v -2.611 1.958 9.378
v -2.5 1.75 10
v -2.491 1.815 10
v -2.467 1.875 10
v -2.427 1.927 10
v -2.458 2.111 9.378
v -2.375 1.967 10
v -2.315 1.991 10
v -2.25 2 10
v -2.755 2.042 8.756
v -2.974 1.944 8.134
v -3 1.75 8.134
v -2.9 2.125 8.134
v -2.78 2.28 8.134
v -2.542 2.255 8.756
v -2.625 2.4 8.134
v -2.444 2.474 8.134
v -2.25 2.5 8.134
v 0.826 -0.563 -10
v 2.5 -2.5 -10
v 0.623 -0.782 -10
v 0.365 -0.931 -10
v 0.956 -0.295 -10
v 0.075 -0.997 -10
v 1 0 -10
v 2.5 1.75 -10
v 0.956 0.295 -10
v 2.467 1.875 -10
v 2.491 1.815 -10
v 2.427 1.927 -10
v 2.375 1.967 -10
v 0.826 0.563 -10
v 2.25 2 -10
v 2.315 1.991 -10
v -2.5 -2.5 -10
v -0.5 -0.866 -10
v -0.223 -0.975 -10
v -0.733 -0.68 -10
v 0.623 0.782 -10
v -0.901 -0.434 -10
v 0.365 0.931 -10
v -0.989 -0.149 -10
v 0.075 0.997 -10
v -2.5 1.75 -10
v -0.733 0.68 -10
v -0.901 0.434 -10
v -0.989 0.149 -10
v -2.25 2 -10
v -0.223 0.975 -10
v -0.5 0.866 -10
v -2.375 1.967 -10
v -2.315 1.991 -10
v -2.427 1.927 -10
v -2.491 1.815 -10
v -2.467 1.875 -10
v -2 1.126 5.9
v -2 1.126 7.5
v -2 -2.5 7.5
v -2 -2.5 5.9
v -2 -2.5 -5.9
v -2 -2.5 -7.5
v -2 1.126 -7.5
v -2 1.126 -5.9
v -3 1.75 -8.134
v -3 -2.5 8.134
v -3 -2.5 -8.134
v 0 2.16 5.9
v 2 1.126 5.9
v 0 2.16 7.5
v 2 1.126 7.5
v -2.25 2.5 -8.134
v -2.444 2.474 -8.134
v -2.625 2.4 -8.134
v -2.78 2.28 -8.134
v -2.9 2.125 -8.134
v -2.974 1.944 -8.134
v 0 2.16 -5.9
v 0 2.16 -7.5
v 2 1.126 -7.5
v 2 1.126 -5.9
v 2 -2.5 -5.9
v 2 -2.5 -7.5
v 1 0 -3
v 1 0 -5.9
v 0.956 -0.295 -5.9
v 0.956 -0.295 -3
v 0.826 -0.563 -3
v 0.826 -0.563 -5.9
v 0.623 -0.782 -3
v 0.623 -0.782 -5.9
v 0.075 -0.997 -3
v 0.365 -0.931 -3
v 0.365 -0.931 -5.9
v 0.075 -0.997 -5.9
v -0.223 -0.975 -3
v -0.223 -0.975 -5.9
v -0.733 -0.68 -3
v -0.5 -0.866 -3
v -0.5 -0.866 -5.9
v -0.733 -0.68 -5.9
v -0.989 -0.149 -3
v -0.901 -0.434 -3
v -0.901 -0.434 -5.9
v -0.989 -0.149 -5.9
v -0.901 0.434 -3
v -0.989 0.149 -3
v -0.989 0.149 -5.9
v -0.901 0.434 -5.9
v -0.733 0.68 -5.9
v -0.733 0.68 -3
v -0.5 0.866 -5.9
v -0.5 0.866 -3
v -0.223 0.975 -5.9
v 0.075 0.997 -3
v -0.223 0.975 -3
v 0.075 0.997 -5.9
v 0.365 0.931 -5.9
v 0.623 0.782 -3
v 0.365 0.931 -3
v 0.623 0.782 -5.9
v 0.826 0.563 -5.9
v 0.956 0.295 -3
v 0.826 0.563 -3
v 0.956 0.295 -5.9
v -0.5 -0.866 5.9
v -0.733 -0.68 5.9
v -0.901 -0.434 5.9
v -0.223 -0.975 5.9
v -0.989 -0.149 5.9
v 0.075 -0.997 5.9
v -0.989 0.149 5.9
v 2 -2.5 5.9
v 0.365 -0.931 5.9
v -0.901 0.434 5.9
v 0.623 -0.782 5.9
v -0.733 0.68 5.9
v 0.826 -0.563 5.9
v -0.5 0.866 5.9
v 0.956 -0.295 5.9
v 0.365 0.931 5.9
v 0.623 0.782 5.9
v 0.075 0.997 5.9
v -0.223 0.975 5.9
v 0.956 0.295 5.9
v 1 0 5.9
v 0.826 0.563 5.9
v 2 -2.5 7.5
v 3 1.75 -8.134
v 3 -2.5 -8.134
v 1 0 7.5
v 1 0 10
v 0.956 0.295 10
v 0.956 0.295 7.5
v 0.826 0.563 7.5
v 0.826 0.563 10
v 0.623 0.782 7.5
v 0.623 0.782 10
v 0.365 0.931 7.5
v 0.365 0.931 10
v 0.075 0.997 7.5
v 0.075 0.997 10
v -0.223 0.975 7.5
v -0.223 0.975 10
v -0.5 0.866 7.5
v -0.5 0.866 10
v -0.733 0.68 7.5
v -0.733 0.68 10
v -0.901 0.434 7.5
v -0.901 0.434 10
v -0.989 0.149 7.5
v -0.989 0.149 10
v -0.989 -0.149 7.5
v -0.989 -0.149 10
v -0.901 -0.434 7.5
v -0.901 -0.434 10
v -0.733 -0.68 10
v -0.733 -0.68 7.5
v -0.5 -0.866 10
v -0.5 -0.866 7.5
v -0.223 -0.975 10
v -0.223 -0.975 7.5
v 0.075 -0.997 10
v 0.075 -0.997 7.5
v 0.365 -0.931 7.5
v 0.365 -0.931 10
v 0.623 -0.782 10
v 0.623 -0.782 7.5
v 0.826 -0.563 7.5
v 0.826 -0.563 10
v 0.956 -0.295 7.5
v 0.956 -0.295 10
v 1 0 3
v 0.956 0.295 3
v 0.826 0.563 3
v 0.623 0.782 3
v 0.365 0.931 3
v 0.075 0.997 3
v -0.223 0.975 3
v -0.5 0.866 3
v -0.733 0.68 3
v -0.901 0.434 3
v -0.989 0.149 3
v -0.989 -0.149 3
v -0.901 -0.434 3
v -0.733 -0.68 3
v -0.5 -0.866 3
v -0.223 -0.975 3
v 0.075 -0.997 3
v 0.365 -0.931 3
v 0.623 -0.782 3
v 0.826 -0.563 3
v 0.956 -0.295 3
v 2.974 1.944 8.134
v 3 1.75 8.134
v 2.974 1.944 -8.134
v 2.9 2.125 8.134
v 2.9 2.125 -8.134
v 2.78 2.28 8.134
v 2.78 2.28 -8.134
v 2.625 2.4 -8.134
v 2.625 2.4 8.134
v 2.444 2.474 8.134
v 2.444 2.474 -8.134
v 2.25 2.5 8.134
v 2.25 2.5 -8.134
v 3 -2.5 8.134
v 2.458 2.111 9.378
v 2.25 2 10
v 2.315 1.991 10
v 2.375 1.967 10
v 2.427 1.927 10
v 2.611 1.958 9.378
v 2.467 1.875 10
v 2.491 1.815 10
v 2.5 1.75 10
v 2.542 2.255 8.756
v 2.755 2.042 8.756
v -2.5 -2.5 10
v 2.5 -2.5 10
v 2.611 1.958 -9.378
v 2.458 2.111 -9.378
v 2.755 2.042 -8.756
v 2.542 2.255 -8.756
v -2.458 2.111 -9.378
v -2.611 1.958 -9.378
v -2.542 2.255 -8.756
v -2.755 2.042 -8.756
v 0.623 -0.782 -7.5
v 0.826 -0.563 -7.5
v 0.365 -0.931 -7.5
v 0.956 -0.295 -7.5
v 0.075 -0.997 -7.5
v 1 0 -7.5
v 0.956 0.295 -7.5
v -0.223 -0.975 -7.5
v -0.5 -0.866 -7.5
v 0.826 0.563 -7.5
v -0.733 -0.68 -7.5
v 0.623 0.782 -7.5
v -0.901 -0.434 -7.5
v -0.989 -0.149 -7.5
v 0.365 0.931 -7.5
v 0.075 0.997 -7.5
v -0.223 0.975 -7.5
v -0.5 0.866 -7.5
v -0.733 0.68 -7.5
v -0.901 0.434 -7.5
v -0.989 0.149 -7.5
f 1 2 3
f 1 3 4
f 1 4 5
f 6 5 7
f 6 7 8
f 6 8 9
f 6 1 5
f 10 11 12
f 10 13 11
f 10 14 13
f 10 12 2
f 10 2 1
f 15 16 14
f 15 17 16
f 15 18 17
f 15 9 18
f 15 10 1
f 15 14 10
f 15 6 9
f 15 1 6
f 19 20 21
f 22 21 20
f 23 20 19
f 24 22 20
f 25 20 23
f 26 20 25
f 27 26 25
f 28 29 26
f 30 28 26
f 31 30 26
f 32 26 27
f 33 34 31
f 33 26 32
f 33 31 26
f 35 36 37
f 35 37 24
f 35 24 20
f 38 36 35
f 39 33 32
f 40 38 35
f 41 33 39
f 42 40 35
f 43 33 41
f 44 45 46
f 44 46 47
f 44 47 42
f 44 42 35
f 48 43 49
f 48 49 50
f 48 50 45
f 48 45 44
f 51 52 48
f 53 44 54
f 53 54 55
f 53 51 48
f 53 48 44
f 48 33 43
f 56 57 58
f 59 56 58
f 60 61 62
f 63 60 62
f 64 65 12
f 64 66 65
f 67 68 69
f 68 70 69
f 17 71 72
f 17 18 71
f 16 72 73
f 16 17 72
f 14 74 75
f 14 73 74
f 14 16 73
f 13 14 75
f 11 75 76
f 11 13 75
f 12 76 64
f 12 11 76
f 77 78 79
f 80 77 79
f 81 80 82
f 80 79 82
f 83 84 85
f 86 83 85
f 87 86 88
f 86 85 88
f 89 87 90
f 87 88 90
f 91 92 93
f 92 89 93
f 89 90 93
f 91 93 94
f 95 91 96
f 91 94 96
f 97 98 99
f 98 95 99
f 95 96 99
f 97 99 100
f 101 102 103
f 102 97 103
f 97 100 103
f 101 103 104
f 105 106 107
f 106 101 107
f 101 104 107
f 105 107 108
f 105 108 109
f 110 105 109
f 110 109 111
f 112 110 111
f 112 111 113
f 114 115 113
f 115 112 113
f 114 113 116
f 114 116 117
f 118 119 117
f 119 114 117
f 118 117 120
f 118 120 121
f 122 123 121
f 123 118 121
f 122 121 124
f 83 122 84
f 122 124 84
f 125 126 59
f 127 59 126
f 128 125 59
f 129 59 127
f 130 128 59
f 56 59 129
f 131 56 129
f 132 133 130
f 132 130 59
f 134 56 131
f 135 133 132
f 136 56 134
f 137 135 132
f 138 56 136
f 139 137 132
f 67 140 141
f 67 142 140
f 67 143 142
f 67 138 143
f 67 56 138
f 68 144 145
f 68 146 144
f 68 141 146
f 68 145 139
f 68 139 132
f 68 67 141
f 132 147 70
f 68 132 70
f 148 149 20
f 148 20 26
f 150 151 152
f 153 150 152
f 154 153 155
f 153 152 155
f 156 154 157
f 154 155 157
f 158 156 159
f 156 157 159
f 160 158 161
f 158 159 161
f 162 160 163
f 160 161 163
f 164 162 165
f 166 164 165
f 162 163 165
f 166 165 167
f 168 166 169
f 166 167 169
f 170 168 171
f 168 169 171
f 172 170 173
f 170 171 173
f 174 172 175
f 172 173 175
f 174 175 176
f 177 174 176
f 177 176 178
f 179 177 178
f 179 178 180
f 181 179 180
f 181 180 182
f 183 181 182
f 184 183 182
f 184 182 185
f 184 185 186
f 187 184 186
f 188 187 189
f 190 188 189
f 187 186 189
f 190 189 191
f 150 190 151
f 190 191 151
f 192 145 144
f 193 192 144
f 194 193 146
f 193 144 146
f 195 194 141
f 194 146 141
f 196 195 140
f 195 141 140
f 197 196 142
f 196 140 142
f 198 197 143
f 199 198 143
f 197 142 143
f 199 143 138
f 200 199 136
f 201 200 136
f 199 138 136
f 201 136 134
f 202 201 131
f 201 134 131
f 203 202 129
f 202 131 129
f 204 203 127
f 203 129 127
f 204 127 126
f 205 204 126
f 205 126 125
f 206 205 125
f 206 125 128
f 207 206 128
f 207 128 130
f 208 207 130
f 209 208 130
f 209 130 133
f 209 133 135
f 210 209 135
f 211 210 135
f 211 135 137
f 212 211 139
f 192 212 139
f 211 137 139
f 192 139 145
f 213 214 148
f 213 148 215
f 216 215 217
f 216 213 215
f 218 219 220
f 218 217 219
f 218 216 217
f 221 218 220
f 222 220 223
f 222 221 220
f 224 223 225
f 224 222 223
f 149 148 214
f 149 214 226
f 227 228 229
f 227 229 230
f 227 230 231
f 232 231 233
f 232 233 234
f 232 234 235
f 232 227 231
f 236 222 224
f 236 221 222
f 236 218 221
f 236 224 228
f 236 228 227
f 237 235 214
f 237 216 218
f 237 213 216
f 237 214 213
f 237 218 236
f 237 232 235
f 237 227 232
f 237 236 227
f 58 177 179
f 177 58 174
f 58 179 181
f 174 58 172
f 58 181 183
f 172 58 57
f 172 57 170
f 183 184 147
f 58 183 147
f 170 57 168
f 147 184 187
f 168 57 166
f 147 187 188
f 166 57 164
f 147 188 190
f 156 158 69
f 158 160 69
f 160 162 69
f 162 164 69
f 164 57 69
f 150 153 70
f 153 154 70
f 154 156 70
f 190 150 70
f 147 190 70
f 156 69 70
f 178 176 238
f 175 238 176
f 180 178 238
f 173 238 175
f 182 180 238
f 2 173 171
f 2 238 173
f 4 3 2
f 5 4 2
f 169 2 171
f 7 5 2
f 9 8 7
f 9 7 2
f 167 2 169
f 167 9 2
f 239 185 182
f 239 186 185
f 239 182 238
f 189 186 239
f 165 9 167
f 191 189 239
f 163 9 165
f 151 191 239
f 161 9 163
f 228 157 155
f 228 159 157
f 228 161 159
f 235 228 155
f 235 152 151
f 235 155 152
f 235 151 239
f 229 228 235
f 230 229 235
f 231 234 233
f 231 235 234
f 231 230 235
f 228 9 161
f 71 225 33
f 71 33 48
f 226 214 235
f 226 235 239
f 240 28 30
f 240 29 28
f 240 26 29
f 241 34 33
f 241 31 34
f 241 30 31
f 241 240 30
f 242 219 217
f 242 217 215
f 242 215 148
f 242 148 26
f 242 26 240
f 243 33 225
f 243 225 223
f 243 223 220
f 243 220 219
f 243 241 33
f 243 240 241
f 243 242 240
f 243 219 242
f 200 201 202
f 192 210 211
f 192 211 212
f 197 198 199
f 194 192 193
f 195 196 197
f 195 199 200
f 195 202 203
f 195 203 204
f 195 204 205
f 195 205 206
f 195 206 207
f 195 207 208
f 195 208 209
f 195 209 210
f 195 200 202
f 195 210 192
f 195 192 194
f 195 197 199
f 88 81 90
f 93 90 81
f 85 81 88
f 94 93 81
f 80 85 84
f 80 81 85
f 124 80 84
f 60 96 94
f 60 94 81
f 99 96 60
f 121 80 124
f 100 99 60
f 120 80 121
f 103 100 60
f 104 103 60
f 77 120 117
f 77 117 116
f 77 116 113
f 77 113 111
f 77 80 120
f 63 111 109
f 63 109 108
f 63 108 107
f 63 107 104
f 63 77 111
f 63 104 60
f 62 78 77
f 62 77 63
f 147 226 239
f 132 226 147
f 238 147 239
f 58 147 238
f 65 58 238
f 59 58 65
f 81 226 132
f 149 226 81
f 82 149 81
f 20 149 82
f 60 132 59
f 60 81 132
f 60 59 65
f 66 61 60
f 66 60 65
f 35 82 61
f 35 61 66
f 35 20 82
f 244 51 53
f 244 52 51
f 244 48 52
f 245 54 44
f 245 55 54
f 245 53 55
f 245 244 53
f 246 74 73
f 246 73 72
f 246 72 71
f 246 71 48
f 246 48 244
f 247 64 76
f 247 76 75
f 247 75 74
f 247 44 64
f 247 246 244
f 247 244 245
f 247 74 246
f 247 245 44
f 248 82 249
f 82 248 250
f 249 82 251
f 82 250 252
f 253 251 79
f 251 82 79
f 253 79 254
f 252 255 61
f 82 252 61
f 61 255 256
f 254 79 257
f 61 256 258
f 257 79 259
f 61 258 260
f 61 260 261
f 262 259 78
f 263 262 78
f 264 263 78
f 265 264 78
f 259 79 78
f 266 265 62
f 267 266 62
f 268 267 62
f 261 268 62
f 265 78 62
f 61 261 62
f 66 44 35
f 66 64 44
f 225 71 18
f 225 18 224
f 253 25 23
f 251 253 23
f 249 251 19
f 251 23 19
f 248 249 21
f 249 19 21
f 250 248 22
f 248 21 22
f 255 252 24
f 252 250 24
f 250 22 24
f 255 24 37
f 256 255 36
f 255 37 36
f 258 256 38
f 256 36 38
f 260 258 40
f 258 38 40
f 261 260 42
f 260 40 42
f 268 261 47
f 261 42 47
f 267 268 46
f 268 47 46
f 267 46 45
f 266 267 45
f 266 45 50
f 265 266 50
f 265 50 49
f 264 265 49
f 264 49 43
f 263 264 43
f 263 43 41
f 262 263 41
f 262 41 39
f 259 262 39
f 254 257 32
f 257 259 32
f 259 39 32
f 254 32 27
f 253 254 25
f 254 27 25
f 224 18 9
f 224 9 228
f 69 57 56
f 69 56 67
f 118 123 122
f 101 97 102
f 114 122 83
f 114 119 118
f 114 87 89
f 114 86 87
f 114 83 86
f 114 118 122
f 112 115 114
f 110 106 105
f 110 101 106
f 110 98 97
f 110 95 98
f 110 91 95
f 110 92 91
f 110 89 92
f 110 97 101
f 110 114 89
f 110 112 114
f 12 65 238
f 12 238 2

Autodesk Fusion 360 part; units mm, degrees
sketch "Sketch1" plane through (0, 0, 0) normal (0, 0, 1) x (1, 0, 0)
  line L0 (3, -2.5) -> (-3, -2.5)
  line L1 (-3, -2.5) -> (-3, 2.5)
  line L2 (-3, 2.5) -> (3, 2.5)
  line L3 (3, 2.5) -> (3, -2.5)
  line L4 (3, -2.5) -> (-3, 2.5) construction
  line L5 (-3, -2.5) -> (3, 2.5) construction
  dimension "dWidth" = 6
  dimension "d2" = 5
extrude "Extrude1" add sketch "Sketch1" along normal blind 10
sketch "Sketch2" plane through (0, 0, 10) normal (0, 0, 1) x (1, 0, 0)
  line L0 (3, 2.5) -> (-3, 2.5)
  line L1 (-3, 2.5) -> (-3, -2.5)
  line L2 (-3, -2.5) -> (3, -2.5)
  line L3 (3, -2.5) -> (3, 2.5)
  circle A0 centre (0, 0) radius 1
  dimension "d5" = 2
extrude "Extrude2" cut sketch "Sketch2" against normal blind 7 contours A0
ref_plane "WorkPlane1" through (0, 0, 7.5) normal (0, 0, 1) x (1, 0, 0)
sketch "Sketch3" plane through (0, 0, 7.5) normal (0, 0, 1) x (1, 0, 0)
  line L0 (2, -2.16) -> (-2, -2.16) construction
  line L1 (-2, -2.16) -> (-2, 2.16) construction
  line L2 (-2, 2.16) -> (2, 2.16) construction
  line L3 (2, 2.16) -> (2, -2.16) construction
  line L4 (2, -2.16) -> (-2, 2.16) construction
  line L5 (-2, -2.16) -> (2, 2.16) construction
  line L6 (-2, 0) -> (2, 0) construction
  line L7 (2, 1.1258) -> (2, -1.1258)
  line L8 (-2, 1.1258) -> (-2, -1.1258)
  line L9 (0, 2.16) -> (0, -2.16) construction
  line L10 (-2, 1.1258) -> (0, 2.16)
  line L11 (2, 1.1258) -> (0, 2.16)
  line L12 (-2, -1.1258) -> (0, -2.16) construction
  line L13 (0, -2.16) -> (2, -1.1258) construction
  line L14 (-2, -1.1258) -> (-2, -2.5)
  line L15 (-2, -2.5) -> (2, -2.5)
  line L16 (2, -2.5) -> (2, -1.1258)
  line L17 (3, -2.5) -> (-3, -2.5)
  dimension "d9" = 4
  dimension "d10" = 4.32
extrude "Extrude3" cut sketch "Sketch3" against normal blind 1.6
fillet "Fillet1" radius 0.75 2 edges at (-3, 2.5, 5) (3, 2.5, 5)
chamfer "Chamfer2" distance 0.5 angle 75 2 edges at (3, -0.375, 10) (-3, -0.375, 10) measured on face at (-2.3296, -0.2997, 10) measured on face at (-2.3296, -0.2997, 10) tangent chain off
mirror "Mirror2" about plane through (0, 0, 0) normal (0, 0, 1) of bodies 1 merged
properties part number "Configuration 2"
